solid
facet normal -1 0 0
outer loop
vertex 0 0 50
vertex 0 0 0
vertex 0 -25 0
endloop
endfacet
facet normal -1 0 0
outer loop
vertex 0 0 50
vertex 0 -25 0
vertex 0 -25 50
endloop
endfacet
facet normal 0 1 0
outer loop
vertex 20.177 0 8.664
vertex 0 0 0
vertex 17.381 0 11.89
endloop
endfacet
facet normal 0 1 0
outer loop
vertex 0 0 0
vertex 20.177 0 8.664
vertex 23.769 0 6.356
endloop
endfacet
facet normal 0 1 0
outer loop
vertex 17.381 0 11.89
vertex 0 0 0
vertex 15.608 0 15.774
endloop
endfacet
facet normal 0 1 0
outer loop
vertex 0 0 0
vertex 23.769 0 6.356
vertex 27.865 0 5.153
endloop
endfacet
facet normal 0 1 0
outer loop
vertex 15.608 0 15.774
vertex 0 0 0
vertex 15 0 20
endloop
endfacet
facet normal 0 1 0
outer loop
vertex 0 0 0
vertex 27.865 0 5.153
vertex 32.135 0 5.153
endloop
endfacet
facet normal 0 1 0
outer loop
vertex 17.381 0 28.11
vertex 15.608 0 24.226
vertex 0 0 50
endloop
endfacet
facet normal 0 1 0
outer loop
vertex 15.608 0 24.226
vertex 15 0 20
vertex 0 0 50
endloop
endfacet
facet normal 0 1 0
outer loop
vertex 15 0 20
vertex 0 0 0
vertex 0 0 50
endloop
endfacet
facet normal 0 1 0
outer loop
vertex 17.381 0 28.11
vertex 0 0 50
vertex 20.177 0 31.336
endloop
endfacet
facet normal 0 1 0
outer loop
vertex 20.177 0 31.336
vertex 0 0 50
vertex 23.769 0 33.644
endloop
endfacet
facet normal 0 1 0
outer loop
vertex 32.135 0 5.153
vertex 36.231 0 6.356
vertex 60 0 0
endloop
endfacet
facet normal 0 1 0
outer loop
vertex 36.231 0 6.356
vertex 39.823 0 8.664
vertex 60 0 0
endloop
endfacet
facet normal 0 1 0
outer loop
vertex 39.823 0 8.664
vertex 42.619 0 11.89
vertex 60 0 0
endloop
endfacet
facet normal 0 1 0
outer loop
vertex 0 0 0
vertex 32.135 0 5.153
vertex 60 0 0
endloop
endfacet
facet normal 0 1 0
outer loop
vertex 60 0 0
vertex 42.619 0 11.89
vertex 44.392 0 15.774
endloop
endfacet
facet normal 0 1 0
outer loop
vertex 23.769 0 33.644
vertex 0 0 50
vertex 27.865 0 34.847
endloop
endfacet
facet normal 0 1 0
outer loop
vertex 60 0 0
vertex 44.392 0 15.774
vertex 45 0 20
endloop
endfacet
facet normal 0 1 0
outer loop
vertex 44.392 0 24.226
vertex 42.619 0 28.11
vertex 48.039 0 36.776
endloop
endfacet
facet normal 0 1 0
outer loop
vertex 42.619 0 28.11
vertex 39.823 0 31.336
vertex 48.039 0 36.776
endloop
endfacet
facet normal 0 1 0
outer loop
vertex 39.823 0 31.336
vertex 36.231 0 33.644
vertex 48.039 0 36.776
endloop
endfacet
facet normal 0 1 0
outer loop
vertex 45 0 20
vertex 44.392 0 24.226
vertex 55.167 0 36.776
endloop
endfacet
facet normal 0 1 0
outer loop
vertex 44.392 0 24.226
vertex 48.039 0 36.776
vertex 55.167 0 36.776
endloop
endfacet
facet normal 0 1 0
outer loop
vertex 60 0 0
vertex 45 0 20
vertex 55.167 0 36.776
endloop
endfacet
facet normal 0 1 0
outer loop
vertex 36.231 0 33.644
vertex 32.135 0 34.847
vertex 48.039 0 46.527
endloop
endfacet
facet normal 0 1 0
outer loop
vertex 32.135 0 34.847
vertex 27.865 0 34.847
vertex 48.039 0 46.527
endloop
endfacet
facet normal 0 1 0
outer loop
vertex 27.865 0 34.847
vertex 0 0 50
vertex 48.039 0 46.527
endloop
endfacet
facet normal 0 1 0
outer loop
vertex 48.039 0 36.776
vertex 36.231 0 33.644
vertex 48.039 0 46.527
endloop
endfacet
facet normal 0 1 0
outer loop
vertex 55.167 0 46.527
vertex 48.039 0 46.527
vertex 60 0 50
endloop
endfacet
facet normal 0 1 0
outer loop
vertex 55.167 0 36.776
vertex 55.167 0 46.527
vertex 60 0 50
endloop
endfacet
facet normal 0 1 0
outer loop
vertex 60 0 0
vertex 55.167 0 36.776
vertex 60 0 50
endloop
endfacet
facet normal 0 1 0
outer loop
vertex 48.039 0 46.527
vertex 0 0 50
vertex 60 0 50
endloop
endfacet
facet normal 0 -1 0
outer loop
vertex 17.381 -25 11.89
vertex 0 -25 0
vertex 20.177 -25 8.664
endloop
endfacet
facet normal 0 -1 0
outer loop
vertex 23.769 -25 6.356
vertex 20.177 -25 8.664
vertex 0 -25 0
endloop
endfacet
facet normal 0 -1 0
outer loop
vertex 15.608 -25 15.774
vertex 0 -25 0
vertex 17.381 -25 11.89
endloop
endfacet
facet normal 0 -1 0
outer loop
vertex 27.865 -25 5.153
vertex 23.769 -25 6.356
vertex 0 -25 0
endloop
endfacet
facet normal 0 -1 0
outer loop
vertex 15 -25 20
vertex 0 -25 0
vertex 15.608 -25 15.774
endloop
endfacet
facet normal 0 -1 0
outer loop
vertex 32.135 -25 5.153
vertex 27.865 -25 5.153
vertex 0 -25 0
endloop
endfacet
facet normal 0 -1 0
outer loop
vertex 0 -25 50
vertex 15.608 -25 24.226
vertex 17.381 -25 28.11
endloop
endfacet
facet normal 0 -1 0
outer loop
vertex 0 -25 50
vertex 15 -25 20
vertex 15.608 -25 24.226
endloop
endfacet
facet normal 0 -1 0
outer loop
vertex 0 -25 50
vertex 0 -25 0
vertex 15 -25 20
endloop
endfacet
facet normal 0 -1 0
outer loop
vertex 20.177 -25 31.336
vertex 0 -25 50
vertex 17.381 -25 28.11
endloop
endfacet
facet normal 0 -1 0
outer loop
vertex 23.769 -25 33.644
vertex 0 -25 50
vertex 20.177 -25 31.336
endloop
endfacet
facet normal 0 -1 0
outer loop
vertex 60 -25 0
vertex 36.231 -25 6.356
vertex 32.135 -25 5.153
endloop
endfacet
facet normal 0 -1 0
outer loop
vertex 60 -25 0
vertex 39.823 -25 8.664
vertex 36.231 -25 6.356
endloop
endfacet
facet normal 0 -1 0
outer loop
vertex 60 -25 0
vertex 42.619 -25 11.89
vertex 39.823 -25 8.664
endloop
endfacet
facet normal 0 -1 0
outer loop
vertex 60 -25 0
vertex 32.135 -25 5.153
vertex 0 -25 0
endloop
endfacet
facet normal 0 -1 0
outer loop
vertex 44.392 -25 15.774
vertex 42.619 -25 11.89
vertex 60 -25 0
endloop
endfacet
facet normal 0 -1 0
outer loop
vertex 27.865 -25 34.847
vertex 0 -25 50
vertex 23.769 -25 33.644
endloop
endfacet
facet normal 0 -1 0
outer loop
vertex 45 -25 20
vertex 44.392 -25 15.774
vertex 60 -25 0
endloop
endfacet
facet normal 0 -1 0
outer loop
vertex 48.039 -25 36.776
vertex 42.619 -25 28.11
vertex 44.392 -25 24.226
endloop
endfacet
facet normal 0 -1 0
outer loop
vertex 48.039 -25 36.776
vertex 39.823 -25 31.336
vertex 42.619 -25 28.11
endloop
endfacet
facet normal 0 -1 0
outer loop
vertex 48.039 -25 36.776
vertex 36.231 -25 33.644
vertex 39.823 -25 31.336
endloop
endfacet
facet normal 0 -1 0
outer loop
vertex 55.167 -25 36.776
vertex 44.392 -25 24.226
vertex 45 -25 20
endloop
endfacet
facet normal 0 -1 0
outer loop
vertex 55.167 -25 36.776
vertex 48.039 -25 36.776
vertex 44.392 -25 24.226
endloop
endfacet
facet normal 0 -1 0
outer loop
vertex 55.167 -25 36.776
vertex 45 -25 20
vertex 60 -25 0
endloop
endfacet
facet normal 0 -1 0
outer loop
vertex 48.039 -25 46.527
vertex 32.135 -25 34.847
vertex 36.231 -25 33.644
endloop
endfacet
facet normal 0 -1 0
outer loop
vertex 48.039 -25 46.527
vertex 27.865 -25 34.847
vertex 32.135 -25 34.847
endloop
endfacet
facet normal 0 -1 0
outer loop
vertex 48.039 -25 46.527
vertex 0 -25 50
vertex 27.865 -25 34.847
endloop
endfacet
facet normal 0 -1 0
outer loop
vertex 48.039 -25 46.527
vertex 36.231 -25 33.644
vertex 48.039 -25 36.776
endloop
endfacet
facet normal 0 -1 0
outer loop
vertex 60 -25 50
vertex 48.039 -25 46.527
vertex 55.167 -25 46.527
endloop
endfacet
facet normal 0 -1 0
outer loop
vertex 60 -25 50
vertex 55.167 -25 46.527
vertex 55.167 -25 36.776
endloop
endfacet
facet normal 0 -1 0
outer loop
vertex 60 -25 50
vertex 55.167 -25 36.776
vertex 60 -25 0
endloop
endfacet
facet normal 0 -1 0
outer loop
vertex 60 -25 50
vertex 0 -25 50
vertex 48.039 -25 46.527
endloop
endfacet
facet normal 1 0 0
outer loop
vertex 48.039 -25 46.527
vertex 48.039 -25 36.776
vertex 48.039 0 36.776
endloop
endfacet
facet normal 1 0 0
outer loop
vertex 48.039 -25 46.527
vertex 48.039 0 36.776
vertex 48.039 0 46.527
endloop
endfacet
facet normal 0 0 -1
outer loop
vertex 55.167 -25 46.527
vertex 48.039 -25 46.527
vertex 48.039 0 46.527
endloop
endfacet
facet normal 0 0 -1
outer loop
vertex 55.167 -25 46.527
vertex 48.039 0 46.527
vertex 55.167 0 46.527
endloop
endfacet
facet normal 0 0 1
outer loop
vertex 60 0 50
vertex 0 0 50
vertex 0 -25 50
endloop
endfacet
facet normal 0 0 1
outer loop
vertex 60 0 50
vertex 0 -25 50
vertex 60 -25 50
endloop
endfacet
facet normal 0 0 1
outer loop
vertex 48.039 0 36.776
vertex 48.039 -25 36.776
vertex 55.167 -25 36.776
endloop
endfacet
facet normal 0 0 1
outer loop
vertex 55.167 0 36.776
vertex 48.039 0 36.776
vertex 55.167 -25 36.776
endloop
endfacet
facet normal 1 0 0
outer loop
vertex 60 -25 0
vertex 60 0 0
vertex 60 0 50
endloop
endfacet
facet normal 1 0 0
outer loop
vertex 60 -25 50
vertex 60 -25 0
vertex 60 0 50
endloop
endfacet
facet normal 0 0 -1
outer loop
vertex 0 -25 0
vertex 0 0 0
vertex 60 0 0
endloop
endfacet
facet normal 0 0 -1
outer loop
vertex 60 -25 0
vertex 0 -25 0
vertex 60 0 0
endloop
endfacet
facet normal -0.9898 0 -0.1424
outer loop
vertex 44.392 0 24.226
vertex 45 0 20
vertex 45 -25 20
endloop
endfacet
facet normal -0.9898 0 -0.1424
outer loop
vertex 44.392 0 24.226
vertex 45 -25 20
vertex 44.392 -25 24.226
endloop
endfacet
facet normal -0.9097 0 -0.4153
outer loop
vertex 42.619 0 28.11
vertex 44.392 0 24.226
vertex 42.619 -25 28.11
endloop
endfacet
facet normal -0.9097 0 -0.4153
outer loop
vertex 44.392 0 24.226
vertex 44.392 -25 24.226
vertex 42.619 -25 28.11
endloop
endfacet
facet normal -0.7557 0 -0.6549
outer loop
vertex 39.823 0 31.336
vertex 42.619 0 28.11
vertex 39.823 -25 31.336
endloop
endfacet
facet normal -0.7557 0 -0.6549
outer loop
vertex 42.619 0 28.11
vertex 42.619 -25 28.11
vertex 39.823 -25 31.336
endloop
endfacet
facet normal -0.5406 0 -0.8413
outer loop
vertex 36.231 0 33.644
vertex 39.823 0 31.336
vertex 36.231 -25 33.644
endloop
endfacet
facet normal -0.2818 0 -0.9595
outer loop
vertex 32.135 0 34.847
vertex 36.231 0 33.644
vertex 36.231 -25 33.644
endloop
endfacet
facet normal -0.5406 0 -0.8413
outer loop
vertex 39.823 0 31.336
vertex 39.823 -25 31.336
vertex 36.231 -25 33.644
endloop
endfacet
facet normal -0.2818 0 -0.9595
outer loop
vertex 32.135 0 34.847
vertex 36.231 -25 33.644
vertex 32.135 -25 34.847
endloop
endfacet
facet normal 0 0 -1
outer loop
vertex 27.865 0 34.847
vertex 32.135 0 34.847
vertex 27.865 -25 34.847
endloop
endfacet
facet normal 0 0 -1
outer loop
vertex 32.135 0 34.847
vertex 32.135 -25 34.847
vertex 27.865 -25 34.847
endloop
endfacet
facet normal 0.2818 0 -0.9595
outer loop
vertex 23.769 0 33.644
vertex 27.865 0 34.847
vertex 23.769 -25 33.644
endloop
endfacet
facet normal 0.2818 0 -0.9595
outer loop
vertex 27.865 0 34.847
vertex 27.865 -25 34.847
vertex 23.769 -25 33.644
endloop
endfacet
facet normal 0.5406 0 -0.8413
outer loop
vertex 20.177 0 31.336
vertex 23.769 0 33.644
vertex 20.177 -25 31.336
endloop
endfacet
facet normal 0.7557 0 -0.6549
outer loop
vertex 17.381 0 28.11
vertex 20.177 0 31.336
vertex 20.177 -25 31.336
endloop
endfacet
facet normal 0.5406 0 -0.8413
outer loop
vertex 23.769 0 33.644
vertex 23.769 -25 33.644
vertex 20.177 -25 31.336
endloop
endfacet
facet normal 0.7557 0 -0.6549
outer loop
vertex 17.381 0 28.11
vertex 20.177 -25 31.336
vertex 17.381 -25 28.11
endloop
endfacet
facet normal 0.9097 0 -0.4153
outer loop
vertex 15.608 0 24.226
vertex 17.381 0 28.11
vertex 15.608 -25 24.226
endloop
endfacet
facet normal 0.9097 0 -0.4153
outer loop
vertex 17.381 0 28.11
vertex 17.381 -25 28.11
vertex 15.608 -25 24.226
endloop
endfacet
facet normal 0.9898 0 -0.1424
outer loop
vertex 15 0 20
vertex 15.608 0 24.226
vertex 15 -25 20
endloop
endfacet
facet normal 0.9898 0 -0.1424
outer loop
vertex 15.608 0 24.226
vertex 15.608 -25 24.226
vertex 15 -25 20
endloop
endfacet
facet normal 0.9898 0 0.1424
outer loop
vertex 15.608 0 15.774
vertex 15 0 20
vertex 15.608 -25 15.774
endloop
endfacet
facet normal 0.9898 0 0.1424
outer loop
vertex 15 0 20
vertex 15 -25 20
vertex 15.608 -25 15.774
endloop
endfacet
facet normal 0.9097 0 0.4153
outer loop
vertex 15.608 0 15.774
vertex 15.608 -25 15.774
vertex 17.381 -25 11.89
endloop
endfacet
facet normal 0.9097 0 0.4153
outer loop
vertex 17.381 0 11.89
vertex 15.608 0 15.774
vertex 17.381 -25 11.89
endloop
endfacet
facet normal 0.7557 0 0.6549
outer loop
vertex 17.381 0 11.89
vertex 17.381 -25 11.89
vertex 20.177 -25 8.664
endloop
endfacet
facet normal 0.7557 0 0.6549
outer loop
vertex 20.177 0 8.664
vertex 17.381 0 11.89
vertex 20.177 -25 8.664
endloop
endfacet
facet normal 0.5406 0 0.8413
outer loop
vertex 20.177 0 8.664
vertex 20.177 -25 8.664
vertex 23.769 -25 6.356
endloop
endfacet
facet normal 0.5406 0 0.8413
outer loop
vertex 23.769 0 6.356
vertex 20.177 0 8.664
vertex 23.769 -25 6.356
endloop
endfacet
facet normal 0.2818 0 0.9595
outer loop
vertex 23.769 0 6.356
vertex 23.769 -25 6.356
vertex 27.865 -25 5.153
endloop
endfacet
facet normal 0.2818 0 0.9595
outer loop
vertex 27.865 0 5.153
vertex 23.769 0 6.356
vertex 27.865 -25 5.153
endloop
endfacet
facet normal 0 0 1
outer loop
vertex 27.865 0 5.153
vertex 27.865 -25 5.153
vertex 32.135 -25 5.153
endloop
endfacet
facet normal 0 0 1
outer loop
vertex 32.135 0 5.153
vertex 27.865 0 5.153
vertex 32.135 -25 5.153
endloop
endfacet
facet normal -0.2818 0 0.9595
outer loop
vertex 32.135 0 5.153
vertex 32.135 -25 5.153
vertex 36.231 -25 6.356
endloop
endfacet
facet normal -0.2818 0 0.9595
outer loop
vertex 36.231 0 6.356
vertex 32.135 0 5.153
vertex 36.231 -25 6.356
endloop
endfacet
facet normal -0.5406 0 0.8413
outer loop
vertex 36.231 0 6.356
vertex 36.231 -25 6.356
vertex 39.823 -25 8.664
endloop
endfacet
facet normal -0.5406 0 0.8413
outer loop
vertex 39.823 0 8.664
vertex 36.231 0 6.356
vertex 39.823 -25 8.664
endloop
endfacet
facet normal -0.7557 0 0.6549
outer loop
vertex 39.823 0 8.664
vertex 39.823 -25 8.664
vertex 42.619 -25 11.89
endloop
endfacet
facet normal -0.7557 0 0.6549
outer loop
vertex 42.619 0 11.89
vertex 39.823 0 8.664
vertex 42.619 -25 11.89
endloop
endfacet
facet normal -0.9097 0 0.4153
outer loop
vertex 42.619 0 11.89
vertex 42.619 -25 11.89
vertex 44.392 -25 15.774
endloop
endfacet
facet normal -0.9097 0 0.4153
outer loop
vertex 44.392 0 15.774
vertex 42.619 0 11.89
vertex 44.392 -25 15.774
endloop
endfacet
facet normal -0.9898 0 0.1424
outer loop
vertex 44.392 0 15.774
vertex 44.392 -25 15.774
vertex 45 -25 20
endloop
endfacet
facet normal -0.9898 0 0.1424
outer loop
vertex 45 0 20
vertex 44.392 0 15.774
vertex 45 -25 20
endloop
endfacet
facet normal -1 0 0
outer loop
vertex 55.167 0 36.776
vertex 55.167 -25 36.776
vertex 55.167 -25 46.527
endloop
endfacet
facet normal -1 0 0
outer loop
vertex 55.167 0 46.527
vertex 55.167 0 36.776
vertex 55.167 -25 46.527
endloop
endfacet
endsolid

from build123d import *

# Parameters (mm, degrees)
F0_W     = 60
F0_H     = 50
F1_DEPTH = 25
F2_R     = 15
F3_DEPTH = 25.001
F4_W     = 7.128705
F4_H     = 9.750254
F5_DEPTH = 25


with BuildPart() as f1:
    # F0 (on Front) → F1 (new body)
    with BuildSketch(Plane.XZ):
        with Locations((30, 25)):
            Rectangle(F0_W, F0_H)
    extrude(amount=F1_DEPTH)

    # F2 (on face) → F3 (cut, through all)
    with BuildSketch(Plane.XZ.offset(25)):
        with Locations((30, 20)):
            Circle(F2_R)
    extrude(amount=-F3_DEPTH, mode=Mode.SUBTRACT)

    # F4 (on face) → F5 (cut)
    with BuildSketch(Plane.XZ.offset(25)):
        with Locations((51.603125, 41.651424)):
            Rectangle(F4_W, F4_H)
    extrude(amount=-F5_DEPTH, mode=Mode.SUBTRACT)


solid = f1.part
